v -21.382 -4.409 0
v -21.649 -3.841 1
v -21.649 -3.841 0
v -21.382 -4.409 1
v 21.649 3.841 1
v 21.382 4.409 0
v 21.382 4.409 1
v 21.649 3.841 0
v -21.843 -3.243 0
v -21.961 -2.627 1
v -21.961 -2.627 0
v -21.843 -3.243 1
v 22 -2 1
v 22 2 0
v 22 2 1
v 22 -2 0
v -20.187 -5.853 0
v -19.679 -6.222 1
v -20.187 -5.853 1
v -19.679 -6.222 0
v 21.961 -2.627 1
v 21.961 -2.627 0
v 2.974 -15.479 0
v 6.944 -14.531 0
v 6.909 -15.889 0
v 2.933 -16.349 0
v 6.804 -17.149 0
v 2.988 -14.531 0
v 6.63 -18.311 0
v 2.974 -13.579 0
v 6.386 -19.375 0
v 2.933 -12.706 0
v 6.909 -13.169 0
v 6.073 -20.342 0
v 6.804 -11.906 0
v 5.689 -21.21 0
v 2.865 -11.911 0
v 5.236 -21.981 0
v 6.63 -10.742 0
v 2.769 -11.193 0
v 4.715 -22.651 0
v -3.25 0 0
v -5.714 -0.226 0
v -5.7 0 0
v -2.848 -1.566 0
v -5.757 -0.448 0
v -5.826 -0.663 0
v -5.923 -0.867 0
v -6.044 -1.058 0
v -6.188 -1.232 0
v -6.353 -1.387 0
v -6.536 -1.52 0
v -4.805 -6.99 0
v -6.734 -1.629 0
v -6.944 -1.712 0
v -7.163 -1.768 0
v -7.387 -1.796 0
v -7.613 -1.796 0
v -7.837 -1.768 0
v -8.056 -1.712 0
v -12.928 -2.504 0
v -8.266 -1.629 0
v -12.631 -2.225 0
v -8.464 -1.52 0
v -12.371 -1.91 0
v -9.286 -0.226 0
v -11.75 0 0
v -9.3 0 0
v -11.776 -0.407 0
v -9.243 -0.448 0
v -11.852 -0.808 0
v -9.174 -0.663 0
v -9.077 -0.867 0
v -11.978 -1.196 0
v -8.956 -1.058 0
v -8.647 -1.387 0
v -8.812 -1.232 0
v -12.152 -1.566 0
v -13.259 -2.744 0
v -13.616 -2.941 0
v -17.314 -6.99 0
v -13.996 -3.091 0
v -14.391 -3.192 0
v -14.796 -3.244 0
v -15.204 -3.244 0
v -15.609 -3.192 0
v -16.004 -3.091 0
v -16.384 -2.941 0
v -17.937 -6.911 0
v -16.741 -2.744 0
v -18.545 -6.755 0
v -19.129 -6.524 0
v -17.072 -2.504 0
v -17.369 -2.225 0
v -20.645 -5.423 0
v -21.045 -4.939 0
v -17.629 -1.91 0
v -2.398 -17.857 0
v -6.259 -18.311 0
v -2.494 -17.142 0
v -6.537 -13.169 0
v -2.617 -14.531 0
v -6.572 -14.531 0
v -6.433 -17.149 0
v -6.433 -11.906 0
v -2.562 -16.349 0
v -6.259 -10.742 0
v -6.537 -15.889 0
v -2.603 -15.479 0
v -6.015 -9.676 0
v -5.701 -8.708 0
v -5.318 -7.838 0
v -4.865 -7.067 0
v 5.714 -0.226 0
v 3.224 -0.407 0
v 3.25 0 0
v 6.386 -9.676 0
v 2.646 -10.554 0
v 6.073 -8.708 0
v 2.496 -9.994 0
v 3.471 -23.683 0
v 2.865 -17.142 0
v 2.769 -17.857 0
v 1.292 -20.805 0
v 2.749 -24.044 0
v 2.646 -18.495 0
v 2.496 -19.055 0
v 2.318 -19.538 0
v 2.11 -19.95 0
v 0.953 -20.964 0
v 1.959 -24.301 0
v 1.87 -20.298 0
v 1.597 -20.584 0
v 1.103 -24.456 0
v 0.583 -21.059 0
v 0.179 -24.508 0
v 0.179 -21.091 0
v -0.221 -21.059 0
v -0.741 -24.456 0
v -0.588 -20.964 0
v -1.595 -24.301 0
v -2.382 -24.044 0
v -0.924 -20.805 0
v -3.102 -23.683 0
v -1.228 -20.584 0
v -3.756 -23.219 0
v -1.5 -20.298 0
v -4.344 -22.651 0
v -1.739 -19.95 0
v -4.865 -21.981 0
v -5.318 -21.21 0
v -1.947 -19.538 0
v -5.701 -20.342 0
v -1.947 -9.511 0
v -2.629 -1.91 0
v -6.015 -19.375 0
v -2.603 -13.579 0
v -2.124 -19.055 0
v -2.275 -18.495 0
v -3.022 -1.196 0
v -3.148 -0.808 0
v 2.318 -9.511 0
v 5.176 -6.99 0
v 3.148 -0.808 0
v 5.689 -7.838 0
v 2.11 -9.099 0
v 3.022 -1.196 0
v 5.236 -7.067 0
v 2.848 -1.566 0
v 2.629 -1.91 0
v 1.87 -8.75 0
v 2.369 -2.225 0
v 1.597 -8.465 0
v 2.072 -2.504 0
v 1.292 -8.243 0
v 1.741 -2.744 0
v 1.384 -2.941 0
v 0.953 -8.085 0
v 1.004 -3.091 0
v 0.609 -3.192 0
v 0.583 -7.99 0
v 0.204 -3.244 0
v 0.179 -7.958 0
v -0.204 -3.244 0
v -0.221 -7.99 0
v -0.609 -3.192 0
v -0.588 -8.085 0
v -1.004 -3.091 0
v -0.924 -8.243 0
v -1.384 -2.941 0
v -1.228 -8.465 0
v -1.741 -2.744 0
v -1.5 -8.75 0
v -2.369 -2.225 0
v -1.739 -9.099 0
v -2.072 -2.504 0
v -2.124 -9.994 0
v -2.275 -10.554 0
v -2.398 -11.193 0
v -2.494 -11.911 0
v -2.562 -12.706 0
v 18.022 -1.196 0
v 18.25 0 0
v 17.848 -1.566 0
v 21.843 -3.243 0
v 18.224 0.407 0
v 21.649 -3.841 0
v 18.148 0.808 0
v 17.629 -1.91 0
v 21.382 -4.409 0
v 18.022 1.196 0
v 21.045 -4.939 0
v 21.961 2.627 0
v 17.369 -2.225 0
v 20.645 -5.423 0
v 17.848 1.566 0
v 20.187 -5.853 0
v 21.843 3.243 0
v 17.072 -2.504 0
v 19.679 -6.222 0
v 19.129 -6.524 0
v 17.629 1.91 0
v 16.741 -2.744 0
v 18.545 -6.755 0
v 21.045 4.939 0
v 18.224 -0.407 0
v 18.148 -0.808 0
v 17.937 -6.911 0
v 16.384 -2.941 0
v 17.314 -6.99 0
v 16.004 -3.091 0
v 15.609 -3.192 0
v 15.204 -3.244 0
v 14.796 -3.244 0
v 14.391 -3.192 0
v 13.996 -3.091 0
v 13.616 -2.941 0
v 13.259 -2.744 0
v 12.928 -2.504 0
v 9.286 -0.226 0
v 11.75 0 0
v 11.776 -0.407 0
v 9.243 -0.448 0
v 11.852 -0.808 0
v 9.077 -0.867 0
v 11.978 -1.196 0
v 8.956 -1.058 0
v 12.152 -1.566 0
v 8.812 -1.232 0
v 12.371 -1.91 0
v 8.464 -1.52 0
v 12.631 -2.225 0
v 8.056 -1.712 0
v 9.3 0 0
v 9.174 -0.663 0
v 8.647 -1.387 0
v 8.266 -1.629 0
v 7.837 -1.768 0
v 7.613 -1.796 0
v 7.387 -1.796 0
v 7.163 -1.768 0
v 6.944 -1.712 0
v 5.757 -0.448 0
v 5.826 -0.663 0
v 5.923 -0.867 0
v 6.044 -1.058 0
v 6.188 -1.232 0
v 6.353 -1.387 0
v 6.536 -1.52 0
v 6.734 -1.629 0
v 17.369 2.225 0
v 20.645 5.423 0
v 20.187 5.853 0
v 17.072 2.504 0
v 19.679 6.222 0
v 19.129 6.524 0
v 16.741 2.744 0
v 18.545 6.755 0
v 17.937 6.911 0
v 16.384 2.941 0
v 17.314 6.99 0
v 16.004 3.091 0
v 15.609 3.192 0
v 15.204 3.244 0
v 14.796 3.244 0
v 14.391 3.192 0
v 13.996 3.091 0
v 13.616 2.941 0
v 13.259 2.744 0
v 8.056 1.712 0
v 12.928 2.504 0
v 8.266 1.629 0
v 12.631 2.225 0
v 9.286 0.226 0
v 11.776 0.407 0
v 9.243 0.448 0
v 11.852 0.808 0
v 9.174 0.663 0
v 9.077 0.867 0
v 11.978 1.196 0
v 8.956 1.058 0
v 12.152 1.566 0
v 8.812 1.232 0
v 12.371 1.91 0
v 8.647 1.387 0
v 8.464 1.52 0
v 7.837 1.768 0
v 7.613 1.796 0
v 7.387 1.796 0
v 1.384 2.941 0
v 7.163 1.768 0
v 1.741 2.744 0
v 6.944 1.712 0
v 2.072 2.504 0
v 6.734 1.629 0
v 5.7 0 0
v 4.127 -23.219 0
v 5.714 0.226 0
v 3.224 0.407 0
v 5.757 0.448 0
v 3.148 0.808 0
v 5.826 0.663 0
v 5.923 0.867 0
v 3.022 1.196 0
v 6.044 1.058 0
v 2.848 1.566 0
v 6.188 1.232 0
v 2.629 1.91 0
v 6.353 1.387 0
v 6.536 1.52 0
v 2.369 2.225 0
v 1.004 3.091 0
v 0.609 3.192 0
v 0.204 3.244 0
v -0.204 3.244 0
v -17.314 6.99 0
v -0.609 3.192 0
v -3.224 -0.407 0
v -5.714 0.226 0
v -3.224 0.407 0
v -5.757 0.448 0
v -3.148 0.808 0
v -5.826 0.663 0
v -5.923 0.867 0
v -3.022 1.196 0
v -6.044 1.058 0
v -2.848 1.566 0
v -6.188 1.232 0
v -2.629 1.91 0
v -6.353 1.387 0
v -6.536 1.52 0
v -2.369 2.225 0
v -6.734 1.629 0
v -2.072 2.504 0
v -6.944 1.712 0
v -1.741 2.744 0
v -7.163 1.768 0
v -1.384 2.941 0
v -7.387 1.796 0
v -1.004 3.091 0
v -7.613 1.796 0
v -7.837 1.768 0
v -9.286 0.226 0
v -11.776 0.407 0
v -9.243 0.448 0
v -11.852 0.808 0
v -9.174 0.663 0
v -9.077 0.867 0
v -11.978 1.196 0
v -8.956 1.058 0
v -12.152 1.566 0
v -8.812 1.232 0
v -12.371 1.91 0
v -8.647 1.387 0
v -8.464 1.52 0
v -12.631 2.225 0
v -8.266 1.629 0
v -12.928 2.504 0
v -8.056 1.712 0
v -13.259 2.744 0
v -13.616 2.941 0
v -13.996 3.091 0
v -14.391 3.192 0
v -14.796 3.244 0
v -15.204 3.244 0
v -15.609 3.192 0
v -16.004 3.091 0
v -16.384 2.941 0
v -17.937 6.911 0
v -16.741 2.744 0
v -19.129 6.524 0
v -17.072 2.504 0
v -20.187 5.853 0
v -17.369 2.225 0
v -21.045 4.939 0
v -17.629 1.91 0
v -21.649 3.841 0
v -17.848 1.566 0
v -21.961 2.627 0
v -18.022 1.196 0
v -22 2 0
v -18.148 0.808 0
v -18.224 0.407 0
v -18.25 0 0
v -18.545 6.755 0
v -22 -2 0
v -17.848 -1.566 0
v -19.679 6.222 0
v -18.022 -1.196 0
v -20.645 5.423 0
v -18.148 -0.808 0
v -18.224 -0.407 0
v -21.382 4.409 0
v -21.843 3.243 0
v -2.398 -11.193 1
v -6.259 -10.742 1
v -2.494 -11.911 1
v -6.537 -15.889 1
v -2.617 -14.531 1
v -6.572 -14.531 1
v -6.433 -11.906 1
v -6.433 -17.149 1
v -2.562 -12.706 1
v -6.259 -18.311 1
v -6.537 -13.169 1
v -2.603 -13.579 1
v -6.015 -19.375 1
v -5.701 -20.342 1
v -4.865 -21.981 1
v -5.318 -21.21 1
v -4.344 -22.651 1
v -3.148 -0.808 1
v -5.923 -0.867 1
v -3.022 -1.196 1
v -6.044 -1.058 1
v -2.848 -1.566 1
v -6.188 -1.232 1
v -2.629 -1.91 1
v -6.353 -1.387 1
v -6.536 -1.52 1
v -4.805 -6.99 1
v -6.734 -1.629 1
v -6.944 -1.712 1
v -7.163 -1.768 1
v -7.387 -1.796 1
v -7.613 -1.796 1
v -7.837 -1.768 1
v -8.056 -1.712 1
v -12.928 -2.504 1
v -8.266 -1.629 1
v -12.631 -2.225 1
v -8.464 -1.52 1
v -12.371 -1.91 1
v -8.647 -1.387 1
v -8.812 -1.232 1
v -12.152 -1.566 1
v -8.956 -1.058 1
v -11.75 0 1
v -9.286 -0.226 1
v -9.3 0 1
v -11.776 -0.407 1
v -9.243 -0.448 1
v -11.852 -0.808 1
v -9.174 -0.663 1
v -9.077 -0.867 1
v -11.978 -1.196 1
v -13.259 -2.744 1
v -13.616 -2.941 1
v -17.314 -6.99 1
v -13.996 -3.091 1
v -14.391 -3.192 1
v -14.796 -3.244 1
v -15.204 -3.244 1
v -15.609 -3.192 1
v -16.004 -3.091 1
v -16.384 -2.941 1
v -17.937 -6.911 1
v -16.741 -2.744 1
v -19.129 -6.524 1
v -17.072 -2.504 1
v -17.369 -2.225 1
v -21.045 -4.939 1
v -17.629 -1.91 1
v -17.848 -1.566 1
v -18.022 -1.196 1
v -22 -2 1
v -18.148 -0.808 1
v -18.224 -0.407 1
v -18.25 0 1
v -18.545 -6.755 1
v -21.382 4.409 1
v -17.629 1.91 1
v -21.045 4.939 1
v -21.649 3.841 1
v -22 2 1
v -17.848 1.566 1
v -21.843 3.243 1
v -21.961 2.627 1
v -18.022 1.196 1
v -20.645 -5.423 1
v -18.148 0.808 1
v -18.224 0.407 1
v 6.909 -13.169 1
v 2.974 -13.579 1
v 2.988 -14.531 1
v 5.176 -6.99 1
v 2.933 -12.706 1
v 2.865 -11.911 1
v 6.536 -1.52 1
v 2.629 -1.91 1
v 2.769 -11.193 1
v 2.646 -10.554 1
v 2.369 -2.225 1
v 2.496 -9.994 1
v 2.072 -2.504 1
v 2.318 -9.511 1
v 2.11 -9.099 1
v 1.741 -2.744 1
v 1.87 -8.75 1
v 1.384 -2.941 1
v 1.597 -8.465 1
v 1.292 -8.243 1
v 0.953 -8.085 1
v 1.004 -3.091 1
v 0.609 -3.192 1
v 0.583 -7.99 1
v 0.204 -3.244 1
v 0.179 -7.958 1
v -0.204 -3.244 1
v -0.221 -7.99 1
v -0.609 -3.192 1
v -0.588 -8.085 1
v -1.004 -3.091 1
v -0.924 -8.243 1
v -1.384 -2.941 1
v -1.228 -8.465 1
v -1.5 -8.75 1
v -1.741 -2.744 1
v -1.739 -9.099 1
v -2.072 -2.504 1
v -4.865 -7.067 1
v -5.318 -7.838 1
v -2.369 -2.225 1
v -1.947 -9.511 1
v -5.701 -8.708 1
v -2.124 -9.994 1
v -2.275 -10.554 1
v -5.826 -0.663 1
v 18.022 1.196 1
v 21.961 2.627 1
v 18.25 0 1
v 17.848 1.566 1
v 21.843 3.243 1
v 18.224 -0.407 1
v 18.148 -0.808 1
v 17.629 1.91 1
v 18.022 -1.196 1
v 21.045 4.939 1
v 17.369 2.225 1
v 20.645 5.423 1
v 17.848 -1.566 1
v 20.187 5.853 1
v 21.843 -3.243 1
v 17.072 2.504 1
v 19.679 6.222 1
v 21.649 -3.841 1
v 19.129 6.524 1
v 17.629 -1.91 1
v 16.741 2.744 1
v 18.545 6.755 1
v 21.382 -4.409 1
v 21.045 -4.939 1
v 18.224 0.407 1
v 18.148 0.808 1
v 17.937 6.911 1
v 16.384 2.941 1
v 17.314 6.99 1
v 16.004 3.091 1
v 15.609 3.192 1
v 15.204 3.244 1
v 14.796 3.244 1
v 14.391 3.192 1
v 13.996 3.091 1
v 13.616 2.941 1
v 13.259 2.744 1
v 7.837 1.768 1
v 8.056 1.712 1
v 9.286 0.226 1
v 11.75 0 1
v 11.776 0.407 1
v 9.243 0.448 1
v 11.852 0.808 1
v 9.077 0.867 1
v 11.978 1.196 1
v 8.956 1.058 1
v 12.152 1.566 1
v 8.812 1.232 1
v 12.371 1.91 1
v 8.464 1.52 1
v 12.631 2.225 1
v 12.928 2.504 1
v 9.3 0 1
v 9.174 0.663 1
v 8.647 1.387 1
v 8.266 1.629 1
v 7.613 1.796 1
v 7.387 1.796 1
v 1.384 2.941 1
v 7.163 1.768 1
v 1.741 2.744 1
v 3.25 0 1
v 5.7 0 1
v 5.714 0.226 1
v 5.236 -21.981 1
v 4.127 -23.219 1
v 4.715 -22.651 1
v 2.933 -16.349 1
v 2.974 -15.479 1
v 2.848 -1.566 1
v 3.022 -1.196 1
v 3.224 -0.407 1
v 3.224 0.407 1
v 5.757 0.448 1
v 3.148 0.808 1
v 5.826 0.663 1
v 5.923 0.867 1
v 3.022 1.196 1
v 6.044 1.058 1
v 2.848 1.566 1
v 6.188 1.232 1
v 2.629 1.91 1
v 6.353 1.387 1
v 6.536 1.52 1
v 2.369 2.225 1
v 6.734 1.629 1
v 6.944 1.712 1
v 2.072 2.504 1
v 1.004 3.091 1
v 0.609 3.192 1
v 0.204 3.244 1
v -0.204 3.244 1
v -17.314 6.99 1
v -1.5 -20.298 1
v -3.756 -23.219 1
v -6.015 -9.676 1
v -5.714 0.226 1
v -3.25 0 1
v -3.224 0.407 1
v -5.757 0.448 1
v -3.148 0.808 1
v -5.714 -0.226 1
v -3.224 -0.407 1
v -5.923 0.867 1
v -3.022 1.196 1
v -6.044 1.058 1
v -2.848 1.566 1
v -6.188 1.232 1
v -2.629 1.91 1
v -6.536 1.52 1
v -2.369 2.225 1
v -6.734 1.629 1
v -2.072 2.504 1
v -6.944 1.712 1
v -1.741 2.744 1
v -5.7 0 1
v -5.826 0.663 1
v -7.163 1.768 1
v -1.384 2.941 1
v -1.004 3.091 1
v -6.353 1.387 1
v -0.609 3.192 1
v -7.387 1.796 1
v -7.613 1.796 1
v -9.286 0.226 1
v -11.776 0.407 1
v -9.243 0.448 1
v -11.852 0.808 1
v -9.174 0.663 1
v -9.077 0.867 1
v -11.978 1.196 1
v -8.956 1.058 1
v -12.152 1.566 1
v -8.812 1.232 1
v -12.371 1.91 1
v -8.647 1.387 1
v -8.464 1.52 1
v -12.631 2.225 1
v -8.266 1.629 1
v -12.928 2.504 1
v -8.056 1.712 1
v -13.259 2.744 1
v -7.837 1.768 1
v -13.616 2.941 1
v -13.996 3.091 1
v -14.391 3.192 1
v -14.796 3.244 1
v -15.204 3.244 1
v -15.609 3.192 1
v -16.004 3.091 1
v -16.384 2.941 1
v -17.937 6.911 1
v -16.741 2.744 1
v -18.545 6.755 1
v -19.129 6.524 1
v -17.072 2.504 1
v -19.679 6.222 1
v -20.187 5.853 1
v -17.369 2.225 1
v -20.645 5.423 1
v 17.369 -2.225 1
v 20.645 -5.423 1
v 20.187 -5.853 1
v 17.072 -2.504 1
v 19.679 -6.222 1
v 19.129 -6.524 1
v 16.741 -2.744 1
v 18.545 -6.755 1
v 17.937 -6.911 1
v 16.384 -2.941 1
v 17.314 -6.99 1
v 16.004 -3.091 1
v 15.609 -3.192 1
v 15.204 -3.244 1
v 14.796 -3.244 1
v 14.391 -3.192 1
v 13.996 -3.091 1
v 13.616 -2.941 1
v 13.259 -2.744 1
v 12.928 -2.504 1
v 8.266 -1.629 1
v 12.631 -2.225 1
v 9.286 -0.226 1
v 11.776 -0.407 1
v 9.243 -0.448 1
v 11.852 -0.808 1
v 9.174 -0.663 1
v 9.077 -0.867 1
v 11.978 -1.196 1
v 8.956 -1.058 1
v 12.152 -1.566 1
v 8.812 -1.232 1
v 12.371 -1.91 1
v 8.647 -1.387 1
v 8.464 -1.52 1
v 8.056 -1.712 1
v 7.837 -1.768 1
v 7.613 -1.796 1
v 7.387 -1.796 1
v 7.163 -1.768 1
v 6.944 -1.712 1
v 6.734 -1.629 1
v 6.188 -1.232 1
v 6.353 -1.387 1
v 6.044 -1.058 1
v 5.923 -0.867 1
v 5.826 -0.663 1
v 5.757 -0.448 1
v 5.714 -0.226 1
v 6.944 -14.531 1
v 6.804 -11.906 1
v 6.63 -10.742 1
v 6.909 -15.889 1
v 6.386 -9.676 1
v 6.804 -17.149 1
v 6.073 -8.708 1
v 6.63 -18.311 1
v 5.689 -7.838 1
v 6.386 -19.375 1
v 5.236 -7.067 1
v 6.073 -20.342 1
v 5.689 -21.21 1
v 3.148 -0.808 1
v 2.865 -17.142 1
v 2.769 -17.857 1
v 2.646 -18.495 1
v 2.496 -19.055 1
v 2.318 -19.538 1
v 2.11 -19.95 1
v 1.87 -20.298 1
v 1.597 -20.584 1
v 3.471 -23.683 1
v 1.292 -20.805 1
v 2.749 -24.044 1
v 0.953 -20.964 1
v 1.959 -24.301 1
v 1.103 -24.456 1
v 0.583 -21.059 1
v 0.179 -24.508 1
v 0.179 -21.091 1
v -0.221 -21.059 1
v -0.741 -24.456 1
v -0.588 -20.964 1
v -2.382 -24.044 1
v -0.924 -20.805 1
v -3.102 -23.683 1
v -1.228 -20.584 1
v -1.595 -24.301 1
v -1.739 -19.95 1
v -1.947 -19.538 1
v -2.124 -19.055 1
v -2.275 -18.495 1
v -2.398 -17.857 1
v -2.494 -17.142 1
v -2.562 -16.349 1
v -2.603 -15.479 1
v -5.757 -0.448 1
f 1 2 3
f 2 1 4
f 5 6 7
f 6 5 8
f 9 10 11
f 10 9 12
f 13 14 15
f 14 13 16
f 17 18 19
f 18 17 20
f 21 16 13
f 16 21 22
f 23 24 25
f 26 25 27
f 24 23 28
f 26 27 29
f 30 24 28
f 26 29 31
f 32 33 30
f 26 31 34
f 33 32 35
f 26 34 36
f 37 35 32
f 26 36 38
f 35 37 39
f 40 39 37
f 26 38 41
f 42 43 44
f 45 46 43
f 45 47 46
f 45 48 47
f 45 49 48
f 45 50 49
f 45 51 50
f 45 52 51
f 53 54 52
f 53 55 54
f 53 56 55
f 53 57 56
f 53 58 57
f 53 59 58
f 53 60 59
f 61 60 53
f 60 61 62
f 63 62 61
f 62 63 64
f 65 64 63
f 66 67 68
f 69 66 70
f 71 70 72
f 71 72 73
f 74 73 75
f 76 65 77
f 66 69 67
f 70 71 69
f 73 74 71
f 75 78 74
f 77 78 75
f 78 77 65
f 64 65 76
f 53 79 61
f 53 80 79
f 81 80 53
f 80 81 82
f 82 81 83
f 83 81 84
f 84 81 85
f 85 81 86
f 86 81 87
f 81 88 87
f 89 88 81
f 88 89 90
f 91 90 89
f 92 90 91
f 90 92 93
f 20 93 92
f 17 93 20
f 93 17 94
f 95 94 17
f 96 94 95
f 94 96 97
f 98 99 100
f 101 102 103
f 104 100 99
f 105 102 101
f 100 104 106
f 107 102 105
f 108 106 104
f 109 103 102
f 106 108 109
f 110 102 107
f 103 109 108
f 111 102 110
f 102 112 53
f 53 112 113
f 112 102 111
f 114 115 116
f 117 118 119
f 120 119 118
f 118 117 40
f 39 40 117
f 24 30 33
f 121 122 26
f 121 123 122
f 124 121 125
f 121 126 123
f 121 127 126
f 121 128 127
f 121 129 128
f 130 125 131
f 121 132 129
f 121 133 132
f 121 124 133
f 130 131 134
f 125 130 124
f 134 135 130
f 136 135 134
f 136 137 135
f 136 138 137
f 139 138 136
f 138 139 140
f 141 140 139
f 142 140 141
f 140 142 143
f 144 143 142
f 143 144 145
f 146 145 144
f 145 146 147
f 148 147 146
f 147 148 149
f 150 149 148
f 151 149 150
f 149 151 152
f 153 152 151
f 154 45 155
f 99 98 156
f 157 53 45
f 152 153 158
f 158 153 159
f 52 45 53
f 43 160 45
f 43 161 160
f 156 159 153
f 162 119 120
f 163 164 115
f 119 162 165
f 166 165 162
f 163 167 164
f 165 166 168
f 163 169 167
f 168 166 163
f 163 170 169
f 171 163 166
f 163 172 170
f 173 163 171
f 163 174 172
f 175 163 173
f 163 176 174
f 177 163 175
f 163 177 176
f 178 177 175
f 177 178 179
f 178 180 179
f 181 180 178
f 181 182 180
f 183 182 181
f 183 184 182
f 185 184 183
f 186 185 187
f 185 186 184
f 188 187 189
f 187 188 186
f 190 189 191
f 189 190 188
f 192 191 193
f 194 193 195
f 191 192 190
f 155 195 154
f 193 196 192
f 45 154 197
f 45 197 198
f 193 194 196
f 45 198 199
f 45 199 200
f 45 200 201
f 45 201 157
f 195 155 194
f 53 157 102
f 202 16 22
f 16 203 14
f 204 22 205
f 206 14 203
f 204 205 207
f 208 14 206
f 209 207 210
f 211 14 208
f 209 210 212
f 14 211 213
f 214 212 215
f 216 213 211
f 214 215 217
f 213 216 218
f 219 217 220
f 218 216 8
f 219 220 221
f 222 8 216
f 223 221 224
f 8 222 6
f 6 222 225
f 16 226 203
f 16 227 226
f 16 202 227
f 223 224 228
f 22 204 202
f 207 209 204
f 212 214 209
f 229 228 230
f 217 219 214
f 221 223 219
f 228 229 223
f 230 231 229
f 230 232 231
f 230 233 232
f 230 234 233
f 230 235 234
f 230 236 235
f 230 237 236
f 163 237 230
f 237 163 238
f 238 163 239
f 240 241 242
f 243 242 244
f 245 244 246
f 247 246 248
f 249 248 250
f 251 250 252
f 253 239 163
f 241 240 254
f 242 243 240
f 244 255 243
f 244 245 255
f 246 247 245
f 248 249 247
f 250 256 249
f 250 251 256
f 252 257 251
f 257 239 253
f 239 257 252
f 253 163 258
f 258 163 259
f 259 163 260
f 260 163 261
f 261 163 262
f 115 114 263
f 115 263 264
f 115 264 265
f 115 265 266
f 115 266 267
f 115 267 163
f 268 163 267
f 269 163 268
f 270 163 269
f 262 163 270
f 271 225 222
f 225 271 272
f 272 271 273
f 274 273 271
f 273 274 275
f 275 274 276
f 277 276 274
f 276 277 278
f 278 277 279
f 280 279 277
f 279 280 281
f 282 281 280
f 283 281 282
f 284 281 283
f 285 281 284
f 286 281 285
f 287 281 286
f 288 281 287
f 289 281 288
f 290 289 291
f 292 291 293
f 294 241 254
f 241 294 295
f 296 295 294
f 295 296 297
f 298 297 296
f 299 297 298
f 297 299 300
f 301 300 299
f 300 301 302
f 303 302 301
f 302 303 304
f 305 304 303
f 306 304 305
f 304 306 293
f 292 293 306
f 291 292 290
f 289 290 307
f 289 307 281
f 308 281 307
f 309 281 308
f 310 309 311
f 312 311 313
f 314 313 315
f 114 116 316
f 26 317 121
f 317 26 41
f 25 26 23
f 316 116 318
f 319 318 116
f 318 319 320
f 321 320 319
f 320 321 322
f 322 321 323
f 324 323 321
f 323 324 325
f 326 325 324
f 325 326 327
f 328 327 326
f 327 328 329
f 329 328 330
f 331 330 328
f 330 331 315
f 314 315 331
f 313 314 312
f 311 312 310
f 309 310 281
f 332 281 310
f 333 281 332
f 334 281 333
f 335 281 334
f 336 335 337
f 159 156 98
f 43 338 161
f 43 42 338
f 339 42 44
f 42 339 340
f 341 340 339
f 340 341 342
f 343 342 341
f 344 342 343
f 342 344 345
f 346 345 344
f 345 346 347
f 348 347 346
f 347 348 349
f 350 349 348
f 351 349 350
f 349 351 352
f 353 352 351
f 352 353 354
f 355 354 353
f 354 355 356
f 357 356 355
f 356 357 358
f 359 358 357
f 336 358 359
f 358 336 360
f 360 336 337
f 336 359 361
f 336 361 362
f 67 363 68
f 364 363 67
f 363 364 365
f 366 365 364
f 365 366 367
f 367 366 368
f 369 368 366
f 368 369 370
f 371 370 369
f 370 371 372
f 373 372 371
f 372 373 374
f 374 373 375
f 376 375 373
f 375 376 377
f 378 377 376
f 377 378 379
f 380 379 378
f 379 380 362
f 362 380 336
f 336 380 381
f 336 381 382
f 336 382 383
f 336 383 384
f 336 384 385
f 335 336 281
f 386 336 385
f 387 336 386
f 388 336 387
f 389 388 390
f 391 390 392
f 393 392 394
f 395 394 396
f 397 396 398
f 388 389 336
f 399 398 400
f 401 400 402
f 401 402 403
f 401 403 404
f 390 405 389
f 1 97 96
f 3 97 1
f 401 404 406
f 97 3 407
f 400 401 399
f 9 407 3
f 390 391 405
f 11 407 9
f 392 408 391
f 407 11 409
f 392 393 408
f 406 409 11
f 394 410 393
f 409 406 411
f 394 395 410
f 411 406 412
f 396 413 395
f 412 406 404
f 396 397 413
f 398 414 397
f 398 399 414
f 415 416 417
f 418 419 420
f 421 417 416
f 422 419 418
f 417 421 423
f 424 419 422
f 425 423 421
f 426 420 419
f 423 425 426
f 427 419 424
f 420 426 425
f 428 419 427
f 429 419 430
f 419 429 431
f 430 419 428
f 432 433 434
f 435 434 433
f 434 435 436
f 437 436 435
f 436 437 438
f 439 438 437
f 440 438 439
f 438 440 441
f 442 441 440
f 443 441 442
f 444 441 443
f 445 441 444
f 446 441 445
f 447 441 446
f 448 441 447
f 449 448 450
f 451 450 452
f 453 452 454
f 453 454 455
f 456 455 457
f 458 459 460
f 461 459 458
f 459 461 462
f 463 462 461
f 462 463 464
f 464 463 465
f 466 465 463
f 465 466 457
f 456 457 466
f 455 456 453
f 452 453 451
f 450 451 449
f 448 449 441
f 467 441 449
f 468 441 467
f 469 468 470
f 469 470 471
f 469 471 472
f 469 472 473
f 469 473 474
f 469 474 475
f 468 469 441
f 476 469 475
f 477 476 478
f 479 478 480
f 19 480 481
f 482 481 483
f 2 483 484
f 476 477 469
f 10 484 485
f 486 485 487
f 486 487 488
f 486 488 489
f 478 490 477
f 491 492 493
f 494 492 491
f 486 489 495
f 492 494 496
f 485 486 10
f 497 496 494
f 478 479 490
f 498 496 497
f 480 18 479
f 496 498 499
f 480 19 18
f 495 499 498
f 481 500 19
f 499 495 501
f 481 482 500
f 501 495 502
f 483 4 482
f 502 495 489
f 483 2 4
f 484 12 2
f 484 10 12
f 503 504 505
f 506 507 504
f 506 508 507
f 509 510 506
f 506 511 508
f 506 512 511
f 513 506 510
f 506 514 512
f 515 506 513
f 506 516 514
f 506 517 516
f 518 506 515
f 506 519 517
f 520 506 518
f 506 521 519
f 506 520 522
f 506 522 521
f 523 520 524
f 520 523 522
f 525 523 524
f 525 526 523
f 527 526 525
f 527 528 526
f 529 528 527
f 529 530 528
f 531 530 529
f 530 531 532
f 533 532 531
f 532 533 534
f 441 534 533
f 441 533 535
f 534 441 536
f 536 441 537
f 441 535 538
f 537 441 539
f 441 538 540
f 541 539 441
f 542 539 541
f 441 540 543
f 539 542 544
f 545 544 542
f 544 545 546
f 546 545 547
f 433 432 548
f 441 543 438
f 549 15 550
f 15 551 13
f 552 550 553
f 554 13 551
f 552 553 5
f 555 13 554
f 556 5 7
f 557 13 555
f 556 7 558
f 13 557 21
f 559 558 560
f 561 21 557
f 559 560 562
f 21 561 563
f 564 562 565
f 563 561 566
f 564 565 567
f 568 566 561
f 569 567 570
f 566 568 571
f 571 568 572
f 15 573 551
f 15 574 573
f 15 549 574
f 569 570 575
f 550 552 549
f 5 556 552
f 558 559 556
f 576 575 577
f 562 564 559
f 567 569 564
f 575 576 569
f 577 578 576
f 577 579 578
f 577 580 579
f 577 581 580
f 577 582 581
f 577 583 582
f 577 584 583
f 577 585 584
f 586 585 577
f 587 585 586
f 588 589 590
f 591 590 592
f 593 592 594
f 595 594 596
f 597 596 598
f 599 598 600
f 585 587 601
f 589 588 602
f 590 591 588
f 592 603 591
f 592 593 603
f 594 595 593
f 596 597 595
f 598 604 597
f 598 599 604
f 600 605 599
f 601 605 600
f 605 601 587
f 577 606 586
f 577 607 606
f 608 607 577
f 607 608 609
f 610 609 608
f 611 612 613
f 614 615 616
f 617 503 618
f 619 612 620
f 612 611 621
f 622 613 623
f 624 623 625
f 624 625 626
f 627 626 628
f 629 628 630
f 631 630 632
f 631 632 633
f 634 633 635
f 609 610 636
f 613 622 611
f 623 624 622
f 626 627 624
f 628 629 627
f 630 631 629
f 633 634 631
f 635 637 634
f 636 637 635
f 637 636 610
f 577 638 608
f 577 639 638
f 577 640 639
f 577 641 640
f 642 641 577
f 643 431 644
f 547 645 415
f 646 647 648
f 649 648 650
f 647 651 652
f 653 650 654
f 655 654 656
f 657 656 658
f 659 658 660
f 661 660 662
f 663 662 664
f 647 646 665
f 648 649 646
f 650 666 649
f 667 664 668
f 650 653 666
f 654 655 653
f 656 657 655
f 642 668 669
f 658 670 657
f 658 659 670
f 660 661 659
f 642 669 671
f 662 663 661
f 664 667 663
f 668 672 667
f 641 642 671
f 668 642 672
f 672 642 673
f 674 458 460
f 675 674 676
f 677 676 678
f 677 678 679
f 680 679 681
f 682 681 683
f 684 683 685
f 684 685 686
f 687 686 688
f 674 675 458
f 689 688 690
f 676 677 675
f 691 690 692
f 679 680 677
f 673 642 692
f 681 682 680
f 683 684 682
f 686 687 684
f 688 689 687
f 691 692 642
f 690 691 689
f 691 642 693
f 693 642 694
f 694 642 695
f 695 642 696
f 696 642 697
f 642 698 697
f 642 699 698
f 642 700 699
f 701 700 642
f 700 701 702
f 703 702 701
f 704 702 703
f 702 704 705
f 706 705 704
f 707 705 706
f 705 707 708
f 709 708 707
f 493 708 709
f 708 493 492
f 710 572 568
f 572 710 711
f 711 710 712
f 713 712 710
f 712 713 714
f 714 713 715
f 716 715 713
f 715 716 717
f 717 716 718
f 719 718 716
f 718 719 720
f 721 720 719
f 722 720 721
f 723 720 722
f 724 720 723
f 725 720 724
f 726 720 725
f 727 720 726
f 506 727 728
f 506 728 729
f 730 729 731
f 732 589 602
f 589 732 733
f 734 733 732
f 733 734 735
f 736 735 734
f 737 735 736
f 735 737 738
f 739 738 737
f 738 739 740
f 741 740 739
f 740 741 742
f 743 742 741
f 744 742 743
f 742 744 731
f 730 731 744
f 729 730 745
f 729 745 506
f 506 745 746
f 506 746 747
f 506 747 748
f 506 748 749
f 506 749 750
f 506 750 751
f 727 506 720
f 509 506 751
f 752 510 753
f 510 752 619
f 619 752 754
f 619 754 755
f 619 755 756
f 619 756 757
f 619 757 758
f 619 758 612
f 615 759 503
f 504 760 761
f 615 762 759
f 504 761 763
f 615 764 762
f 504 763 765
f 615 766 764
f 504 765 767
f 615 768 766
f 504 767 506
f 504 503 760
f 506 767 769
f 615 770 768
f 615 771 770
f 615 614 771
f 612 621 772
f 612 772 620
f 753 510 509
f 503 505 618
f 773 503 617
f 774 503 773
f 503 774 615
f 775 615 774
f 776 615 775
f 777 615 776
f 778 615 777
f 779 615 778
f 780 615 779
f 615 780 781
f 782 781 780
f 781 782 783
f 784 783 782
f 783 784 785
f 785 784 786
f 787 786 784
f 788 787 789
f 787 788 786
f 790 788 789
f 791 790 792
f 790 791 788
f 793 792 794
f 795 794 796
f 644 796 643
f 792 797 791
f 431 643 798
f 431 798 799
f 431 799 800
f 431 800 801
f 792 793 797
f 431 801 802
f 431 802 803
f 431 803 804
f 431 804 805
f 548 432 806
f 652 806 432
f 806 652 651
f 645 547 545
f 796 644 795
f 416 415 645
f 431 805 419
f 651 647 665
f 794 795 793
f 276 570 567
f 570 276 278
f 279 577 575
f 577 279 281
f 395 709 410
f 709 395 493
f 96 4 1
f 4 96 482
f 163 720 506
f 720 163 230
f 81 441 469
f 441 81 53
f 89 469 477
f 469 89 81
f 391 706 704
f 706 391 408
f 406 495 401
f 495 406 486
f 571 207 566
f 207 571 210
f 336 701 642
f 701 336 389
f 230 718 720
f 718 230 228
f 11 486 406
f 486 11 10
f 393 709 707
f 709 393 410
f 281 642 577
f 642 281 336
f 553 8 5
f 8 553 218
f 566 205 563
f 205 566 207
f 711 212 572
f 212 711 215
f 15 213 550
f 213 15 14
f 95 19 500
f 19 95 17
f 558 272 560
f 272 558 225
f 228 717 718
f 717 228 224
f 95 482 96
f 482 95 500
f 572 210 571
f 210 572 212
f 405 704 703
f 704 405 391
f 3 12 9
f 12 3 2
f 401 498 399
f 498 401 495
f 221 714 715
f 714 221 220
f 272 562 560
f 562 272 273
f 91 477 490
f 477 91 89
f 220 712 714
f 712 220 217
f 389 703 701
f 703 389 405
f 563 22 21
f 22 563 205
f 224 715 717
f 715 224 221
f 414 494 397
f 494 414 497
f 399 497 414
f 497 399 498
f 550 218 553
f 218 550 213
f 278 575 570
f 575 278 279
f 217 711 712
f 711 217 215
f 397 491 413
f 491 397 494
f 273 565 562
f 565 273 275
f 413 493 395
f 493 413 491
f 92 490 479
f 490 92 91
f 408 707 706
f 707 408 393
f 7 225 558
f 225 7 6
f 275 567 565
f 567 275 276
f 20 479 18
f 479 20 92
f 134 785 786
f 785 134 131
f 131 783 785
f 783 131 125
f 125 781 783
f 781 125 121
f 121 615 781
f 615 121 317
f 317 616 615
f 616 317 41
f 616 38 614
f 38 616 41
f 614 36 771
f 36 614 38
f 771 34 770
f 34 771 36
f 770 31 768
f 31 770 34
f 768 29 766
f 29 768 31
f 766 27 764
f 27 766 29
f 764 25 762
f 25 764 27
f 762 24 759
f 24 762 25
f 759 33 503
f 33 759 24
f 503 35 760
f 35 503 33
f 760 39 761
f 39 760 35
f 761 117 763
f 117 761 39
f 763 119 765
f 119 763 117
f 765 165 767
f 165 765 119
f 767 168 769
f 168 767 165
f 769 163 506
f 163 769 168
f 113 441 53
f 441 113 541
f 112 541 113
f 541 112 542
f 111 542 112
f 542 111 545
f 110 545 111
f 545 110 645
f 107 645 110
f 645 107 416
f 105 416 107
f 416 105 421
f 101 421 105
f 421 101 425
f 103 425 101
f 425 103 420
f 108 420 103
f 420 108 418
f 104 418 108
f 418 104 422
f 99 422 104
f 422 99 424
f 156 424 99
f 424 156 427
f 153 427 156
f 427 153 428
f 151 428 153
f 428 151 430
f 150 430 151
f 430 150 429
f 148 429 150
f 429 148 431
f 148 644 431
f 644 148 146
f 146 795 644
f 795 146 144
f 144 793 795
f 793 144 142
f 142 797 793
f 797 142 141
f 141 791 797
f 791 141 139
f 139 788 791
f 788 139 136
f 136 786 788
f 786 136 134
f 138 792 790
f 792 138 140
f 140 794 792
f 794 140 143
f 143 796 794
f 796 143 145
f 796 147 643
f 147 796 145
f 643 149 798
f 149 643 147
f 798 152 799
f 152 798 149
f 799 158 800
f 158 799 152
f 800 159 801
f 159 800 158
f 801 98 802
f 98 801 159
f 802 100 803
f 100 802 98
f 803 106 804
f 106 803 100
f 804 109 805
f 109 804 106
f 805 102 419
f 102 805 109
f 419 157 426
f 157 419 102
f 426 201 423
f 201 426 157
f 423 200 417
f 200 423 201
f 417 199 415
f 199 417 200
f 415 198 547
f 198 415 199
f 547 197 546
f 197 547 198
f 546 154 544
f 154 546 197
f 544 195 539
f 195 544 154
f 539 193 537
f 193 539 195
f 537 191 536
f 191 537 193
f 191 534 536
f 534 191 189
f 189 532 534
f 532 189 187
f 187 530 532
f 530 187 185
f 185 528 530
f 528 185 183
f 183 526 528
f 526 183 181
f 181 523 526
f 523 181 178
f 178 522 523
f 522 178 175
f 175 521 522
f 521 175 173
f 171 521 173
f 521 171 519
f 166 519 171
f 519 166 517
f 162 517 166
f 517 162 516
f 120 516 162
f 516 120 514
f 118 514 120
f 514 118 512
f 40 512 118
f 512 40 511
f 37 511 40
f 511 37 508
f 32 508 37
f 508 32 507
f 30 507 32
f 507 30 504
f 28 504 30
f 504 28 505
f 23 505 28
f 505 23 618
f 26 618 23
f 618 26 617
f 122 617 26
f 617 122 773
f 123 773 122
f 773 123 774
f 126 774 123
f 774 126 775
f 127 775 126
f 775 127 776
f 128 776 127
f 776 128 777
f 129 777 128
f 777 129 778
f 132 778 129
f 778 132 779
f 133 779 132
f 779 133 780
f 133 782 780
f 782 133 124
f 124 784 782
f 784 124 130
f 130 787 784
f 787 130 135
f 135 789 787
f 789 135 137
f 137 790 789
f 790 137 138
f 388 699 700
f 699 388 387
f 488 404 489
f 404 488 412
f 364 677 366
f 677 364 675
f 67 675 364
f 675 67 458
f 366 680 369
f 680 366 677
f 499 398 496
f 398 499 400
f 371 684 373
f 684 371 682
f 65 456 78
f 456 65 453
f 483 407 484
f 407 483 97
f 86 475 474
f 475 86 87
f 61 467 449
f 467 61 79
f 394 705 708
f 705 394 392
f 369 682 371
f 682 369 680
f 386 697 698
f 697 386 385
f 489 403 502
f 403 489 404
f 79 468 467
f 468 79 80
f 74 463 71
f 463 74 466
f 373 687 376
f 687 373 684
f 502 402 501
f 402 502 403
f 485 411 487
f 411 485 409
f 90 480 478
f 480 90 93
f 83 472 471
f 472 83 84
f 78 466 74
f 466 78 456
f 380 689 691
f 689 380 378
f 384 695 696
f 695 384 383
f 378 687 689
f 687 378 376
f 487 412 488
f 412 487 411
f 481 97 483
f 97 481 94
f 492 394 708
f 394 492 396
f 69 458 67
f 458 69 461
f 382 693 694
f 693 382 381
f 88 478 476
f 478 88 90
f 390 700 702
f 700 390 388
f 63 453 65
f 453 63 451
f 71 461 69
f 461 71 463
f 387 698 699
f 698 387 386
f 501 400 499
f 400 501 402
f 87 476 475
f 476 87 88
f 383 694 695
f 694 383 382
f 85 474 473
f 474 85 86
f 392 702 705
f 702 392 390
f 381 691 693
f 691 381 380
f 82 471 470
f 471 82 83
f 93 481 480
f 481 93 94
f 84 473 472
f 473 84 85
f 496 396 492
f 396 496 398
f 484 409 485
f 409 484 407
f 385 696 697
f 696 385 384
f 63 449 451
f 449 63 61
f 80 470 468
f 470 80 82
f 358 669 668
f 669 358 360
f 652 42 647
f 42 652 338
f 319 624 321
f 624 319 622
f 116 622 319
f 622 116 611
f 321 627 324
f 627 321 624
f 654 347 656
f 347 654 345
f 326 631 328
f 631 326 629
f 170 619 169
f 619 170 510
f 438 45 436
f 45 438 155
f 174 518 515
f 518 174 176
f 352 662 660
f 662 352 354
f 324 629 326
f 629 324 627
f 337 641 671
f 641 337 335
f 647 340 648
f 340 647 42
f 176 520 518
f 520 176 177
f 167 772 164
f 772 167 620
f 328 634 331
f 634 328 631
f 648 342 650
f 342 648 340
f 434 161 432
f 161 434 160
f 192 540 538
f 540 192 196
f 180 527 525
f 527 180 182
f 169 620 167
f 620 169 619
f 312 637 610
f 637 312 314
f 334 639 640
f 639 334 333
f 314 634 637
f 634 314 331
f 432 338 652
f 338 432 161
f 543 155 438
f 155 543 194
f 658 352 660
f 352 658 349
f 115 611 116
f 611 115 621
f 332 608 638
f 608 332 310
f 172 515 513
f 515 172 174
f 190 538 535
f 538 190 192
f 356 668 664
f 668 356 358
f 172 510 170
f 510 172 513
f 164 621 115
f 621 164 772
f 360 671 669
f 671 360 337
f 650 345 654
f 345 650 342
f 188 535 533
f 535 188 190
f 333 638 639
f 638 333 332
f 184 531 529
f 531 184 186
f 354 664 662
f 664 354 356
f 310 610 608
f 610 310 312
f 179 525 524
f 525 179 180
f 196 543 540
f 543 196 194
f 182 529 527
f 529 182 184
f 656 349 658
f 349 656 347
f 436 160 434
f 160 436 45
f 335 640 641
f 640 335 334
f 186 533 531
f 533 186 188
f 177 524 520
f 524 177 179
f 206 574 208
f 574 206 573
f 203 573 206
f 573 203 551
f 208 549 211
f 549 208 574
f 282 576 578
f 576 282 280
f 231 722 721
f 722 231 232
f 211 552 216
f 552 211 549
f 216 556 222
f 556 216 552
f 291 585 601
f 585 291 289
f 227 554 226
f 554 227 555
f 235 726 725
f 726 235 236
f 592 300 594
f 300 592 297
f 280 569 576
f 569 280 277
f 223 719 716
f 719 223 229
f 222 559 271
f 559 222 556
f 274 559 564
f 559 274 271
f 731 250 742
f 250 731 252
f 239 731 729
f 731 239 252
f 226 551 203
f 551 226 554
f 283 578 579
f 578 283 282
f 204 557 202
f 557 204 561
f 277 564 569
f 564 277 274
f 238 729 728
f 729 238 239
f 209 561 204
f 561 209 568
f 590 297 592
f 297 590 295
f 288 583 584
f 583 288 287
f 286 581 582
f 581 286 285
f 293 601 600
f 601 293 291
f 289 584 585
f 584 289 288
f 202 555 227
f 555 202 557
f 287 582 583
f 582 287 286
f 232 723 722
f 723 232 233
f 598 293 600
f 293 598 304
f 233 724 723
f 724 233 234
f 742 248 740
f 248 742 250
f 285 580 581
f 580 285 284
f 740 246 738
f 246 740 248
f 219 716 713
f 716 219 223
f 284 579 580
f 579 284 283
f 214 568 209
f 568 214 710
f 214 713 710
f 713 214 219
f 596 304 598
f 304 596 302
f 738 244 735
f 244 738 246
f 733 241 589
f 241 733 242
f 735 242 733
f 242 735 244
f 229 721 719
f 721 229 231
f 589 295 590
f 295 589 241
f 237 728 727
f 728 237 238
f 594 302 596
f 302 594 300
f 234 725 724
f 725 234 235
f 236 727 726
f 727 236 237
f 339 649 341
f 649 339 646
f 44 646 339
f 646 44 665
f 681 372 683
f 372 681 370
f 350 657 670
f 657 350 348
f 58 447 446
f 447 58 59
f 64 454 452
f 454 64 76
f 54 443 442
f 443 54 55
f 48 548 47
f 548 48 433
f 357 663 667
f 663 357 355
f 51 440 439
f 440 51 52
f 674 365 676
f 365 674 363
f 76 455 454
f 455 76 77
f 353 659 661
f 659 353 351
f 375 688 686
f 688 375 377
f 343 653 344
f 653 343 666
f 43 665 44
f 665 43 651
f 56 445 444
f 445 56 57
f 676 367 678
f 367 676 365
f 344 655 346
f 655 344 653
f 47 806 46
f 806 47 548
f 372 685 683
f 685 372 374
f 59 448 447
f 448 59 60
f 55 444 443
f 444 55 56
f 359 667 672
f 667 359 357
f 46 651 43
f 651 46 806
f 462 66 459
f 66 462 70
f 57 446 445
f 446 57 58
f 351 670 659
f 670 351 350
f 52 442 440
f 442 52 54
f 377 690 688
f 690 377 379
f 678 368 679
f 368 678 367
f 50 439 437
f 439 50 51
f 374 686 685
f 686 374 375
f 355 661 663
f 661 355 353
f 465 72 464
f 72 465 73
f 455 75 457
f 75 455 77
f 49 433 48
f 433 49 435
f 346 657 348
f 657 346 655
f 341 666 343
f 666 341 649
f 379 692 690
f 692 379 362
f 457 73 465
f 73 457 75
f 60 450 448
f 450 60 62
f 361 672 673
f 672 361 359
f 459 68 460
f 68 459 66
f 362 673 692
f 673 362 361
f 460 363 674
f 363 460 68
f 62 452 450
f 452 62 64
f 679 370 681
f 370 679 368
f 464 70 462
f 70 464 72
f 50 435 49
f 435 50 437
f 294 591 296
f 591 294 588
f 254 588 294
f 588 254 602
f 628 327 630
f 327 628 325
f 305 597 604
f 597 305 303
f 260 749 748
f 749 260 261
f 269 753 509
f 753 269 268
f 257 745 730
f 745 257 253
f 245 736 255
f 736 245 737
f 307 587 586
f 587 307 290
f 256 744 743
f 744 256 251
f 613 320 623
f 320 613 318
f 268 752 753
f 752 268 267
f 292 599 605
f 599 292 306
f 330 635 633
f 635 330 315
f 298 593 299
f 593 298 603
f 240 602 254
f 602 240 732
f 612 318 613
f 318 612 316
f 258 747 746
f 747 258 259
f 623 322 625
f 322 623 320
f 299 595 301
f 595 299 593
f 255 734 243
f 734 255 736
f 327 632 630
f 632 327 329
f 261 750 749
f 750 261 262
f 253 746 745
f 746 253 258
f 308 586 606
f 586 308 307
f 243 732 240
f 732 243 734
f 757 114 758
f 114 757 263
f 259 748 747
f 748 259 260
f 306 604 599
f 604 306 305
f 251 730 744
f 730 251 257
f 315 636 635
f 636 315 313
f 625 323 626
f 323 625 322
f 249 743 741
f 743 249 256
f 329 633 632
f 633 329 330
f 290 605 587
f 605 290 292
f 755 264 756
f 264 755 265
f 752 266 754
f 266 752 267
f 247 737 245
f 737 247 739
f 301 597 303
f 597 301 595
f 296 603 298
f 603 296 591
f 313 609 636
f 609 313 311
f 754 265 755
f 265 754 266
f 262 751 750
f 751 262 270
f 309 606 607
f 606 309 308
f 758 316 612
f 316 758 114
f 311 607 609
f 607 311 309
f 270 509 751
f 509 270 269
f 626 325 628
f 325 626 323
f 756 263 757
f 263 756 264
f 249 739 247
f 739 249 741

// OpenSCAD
$fn = 50;


difference() {
	union() {
		*color(alpha = 1.0000000000, c = "gray") {
			translate(v = [0, 14, 0]) {
				linear_extrude(height = 1) {
					text(font = "Arial:style=Bold", halign = "center", size = 4.5000000000, text = "COMMENT description oobb_plate_shape_p_type_1_depth_3_width_1_thickness_o_extra_oobb_size", valign = "center");
				}
			}
		}
		hull() {
			translate(v = [-17.0000000000, 2.0000000000, 0]) {
				cylinder(h = 1, r = 5);
			}
			translate(v = [17.0000000000, 2.0000000000, 0]) {
				cylinder(h = 1, r = 5);
			}
			translate(v = [-17.0000000000, -2.0000000000, 0]) {
				cylinder(h = 1, r = 5);
			}
			translate(v = [17.0000000000, -2.0000000000, 0]) {
				cylinder(h = 1, r = 5);
			}
		}
		translate(v = [0, -5, 0]) {
			linear_extrude(height = 1) {
				text(font = "DejaVu Sans Mono:style=Bold", halign = "center", size = 19.0000000000, text = "O", valign = "top");
			}
		}
	}
	union() {
		*color(alpha = 1.0000000000, c = "gray") {
			translate(v = [0, 14, 0]) {
				linear_extrude(height = 1) {
					text(font = "Arial:style=Bold", halign = "center", size = 4.5000000000, text = "COMMENT description oobb_holes_shape_n_type_3_width_1_thickness_o_extra_oobb_size_1_height_'all'_holes_true_both_holes", valign = "center");
				}
			}
		}
		translate(v = [-15.0000000000, 0.0000000000, 0]) {
			translate(v = [0, 0, -50]) {
				cylinder(h = 100, r = 3.2500000000);
			}
		}
		translate(v = [0, 0, -50]) {
			cylinder(h = 100, r = 3.2500000000);
		}
		translate(v = [15.0000000000, 0.0000000000, 0]) {
			translate(v = [0, 0, -50]) {
				cylinder(h = 100, r = 3.2500000000);
			}
		}
		translate(v = [-15.0000000000, 0.0000000000, 0]) {
			translate(v = [0, 0, -50]) {
				cylinder(h = 100, r = 1.8000000000);
			}
		}
		translate(v = [-7.5000000000, 0.0000000000, 0]) {
			translate(v = [0, 0, -50]) {
				cylinder(h = 100, r = 1.8000000000);
			}
		}
		translate(v = [0, 0, -50]) {
			cylinder(h = 100, r = 1.8000000000);
		}
		translate(v = [7.5000000000, 0.0000000000, 0]) {
			translate(v = [0, 0, -50]) {
				cylinder(h = 100, r = 1.8000000000);
			}
		}
		translate(v = [15.0000000000, 0.0000000000, 0]) {
			translate(v = [0, 0, -50]) {
				cylinder(h = 100, r = 1.8000000000);
			}
		}
	}
}
